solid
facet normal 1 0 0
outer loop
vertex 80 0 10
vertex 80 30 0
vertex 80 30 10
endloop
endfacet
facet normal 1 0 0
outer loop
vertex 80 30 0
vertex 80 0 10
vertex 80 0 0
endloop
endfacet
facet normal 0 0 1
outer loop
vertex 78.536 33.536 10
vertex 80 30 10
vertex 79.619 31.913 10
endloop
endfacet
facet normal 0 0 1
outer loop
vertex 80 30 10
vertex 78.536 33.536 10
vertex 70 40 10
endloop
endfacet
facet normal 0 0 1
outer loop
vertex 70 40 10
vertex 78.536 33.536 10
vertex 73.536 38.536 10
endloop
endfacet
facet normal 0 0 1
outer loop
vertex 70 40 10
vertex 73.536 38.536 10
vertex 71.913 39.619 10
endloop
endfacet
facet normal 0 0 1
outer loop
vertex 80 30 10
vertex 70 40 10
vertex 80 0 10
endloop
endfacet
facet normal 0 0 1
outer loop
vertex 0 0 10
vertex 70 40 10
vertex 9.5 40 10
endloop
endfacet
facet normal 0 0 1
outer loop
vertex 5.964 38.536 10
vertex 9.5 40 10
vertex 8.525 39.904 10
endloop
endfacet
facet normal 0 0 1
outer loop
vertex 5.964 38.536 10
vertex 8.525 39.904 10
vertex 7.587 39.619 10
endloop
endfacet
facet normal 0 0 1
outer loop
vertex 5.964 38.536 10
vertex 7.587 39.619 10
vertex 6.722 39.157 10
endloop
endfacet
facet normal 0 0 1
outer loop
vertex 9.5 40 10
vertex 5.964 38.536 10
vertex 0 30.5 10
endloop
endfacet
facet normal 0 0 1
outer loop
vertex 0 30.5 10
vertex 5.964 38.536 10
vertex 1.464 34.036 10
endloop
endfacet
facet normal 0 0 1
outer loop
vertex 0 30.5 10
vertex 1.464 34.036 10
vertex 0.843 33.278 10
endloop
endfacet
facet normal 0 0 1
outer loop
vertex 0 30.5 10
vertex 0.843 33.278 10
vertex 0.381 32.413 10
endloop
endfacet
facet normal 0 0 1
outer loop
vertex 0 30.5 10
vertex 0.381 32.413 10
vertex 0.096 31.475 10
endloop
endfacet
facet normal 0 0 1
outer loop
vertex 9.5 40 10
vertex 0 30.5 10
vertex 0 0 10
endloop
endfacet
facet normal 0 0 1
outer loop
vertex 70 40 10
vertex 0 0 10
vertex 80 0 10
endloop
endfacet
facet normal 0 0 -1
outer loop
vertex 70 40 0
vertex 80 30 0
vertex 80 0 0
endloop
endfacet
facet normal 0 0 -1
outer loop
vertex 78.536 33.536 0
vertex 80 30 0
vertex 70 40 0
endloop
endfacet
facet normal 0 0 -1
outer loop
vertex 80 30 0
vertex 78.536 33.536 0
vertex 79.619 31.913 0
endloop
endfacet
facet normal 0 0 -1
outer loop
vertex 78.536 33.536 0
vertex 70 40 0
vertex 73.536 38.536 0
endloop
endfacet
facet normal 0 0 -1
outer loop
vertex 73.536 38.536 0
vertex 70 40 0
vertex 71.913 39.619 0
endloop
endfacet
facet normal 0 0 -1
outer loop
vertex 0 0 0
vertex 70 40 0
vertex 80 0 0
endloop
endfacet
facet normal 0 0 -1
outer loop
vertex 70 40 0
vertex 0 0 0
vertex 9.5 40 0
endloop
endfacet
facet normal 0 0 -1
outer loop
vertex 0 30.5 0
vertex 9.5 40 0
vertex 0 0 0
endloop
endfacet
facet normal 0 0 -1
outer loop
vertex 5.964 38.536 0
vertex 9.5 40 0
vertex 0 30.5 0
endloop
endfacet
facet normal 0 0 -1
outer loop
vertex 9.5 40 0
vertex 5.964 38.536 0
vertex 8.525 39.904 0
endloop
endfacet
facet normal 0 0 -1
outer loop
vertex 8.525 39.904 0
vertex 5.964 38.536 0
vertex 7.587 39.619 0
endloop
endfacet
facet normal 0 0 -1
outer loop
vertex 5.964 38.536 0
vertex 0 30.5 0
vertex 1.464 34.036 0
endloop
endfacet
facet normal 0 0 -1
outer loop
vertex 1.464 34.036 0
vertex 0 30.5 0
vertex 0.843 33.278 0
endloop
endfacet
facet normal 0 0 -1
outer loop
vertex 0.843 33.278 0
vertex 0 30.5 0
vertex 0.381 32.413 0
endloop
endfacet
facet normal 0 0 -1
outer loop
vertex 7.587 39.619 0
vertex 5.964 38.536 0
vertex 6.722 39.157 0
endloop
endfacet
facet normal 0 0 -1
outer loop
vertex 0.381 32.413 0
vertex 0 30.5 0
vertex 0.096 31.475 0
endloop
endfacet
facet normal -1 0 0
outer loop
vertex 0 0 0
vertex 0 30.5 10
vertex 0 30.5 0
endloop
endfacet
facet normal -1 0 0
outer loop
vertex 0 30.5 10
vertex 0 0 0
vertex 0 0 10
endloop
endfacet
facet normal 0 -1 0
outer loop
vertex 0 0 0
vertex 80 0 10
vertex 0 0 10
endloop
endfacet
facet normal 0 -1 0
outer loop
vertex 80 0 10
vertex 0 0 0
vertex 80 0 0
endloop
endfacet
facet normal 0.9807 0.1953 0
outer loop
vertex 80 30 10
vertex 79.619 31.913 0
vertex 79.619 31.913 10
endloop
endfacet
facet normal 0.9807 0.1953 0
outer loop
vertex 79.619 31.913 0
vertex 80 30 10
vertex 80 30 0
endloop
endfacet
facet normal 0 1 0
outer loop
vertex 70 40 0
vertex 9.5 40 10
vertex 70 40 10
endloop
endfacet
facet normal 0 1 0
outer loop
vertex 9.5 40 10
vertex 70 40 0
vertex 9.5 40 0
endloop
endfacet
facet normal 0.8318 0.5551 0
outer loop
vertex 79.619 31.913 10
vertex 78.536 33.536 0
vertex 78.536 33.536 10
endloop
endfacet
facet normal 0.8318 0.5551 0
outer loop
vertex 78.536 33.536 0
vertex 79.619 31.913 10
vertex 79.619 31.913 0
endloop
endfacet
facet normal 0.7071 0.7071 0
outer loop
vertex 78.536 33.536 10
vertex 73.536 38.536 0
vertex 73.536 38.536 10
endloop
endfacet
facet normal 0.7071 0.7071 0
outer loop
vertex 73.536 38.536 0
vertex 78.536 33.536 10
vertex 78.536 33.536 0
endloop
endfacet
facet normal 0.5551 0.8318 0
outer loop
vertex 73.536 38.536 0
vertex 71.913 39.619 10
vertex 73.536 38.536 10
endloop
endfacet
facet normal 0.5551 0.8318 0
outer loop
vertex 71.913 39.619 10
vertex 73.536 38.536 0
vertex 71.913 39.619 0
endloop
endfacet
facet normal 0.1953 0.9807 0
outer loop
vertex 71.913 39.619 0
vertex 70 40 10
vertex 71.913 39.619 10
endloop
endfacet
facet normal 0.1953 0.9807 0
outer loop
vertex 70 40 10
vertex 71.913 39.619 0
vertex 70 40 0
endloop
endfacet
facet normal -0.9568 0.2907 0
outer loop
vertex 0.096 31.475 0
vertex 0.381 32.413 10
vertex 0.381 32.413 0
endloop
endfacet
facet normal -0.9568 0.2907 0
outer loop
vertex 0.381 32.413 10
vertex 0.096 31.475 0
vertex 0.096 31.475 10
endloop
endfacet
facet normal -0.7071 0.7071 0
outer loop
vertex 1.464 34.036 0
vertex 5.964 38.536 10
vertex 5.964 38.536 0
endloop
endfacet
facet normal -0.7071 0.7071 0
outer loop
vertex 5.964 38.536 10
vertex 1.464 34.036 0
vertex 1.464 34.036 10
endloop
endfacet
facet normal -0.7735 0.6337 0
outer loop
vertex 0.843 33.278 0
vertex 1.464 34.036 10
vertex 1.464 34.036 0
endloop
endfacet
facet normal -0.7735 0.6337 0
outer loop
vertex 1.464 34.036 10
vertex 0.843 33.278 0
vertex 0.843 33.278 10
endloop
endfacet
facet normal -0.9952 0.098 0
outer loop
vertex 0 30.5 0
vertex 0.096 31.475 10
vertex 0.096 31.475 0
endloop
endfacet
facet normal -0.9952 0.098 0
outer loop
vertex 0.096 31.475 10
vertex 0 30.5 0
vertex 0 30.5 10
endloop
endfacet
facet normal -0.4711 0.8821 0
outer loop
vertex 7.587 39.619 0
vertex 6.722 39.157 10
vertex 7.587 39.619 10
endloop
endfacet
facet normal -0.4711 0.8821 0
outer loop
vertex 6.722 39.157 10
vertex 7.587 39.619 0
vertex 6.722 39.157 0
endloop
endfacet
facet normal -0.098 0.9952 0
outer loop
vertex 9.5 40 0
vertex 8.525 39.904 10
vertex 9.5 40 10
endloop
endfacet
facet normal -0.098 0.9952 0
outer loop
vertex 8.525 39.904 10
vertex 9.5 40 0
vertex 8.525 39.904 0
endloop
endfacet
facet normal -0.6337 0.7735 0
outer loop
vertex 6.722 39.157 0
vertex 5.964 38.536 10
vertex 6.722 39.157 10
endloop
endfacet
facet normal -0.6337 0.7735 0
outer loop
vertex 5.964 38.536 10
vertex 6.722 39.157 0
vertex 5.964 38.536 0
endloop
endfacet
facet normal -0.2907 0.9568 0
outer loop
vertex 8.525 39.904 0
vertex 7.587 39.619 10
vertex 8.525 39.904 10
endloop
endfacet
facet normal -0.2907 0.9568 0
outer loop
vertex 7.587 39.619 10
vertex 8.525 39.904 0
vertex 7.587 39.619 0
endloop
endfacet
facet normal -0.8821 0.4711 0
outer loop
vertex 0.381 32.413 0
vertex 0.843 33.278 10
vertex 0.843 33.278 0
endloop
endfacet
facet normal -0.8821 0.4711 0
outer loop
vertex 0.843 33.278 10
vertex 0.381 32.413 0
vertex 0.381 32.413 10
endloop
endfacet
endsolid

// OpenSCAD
// RAMPS Fan Mount
// Licence: CC BY-SA 3.0, http://creativecommons.org/licenses/by-sa/3.0/
// Author: Dominik Scholz <schlotzz@schlotzz.com> and contributors
// visit: http://www.schlotzz.com


module ramps_fan_mount_cutoff_cube(width, height, depth, cutoff = 5, radius = 5)
{
	union()
	{
		cube([width, height - cutoff - radius, depth]);

		hull()
		{
			for (x = [radius, width - radius])
				translate([x, height - cutoff - radius, 0])
					cylinder(r = radius, h = depth);
	
			for (x = [radius + cutoff, width - radius - cutoff])
				translate([x, height - radius, 0])
					cylinder(r = radius, h = depth);
		}
	}
}


module ramps_fan_mount(width = 64, height = 40, depth = 10, fanDia = 40, fanHoleDia = 3.1, fanHoleDist = 32, grooveDepth = 1.5, grooveHeight = 2.5, thickness = 3.5, $fn = 16)
{

	difference()
	{
		// base corpus
		ramps_fan_mount_cutoff_cube(width, height, depth, cutoff = 4.5, radius = 5);

		// hollow, leave side air guide
		translate([thickness, -thickness, 1.5])
			ramps_fan_mount_cutoff_cube(width - 2 * thickness, height, depth + 2, cutoff = 4.1, radius = 2.5);

		// remove unneeded air guide
		translate([thickness, -1, -1])
			cube([width - 2 * thickness, height - thickness - 8, depth + 2]);

		// add grooves
		translate([thickness - grooveDepth, 2, -1])
			cube([width - 2 * thickness + grooveDepth * 2, grooveHeight, depth + 2]);
		
		// fan mounting holes
		for (x = [(width - fanHoleDist) / 2, (width + fanHoleDist) / 2])
			translate([x, height + 1, depth / 2])
				rotate([90, 0, 0])
					cylinder(r = fanHoleDia / 2, h = thickness + 2);

		// fan hole
		translate([width / 2, height + 1, depth / 2 + fanDia / 2 - fanHoleDia / 2])
			rotate([90, 0, 0])
				cylinder(r = fanDia / 2, h = thickness + 2);

		// smaller legs
		translate([-1, height / 2 - depth, depth * 1.5])
			rotate([0, 90, 0])
				cylinder(r = depth, h = width + 2);
		translate([-1, -1, depth / 2])
			cube([width + 2, height / 2 - depth + 1, depth / 2 + 1]);

	}

}

ramps_fan_mount_cutoff_cube(80, 40, 10);
ramps_fan_mount(fanDia= 72,  fanHoleDia = 3.1, fanHoleDist = 70, $fn = 32);
